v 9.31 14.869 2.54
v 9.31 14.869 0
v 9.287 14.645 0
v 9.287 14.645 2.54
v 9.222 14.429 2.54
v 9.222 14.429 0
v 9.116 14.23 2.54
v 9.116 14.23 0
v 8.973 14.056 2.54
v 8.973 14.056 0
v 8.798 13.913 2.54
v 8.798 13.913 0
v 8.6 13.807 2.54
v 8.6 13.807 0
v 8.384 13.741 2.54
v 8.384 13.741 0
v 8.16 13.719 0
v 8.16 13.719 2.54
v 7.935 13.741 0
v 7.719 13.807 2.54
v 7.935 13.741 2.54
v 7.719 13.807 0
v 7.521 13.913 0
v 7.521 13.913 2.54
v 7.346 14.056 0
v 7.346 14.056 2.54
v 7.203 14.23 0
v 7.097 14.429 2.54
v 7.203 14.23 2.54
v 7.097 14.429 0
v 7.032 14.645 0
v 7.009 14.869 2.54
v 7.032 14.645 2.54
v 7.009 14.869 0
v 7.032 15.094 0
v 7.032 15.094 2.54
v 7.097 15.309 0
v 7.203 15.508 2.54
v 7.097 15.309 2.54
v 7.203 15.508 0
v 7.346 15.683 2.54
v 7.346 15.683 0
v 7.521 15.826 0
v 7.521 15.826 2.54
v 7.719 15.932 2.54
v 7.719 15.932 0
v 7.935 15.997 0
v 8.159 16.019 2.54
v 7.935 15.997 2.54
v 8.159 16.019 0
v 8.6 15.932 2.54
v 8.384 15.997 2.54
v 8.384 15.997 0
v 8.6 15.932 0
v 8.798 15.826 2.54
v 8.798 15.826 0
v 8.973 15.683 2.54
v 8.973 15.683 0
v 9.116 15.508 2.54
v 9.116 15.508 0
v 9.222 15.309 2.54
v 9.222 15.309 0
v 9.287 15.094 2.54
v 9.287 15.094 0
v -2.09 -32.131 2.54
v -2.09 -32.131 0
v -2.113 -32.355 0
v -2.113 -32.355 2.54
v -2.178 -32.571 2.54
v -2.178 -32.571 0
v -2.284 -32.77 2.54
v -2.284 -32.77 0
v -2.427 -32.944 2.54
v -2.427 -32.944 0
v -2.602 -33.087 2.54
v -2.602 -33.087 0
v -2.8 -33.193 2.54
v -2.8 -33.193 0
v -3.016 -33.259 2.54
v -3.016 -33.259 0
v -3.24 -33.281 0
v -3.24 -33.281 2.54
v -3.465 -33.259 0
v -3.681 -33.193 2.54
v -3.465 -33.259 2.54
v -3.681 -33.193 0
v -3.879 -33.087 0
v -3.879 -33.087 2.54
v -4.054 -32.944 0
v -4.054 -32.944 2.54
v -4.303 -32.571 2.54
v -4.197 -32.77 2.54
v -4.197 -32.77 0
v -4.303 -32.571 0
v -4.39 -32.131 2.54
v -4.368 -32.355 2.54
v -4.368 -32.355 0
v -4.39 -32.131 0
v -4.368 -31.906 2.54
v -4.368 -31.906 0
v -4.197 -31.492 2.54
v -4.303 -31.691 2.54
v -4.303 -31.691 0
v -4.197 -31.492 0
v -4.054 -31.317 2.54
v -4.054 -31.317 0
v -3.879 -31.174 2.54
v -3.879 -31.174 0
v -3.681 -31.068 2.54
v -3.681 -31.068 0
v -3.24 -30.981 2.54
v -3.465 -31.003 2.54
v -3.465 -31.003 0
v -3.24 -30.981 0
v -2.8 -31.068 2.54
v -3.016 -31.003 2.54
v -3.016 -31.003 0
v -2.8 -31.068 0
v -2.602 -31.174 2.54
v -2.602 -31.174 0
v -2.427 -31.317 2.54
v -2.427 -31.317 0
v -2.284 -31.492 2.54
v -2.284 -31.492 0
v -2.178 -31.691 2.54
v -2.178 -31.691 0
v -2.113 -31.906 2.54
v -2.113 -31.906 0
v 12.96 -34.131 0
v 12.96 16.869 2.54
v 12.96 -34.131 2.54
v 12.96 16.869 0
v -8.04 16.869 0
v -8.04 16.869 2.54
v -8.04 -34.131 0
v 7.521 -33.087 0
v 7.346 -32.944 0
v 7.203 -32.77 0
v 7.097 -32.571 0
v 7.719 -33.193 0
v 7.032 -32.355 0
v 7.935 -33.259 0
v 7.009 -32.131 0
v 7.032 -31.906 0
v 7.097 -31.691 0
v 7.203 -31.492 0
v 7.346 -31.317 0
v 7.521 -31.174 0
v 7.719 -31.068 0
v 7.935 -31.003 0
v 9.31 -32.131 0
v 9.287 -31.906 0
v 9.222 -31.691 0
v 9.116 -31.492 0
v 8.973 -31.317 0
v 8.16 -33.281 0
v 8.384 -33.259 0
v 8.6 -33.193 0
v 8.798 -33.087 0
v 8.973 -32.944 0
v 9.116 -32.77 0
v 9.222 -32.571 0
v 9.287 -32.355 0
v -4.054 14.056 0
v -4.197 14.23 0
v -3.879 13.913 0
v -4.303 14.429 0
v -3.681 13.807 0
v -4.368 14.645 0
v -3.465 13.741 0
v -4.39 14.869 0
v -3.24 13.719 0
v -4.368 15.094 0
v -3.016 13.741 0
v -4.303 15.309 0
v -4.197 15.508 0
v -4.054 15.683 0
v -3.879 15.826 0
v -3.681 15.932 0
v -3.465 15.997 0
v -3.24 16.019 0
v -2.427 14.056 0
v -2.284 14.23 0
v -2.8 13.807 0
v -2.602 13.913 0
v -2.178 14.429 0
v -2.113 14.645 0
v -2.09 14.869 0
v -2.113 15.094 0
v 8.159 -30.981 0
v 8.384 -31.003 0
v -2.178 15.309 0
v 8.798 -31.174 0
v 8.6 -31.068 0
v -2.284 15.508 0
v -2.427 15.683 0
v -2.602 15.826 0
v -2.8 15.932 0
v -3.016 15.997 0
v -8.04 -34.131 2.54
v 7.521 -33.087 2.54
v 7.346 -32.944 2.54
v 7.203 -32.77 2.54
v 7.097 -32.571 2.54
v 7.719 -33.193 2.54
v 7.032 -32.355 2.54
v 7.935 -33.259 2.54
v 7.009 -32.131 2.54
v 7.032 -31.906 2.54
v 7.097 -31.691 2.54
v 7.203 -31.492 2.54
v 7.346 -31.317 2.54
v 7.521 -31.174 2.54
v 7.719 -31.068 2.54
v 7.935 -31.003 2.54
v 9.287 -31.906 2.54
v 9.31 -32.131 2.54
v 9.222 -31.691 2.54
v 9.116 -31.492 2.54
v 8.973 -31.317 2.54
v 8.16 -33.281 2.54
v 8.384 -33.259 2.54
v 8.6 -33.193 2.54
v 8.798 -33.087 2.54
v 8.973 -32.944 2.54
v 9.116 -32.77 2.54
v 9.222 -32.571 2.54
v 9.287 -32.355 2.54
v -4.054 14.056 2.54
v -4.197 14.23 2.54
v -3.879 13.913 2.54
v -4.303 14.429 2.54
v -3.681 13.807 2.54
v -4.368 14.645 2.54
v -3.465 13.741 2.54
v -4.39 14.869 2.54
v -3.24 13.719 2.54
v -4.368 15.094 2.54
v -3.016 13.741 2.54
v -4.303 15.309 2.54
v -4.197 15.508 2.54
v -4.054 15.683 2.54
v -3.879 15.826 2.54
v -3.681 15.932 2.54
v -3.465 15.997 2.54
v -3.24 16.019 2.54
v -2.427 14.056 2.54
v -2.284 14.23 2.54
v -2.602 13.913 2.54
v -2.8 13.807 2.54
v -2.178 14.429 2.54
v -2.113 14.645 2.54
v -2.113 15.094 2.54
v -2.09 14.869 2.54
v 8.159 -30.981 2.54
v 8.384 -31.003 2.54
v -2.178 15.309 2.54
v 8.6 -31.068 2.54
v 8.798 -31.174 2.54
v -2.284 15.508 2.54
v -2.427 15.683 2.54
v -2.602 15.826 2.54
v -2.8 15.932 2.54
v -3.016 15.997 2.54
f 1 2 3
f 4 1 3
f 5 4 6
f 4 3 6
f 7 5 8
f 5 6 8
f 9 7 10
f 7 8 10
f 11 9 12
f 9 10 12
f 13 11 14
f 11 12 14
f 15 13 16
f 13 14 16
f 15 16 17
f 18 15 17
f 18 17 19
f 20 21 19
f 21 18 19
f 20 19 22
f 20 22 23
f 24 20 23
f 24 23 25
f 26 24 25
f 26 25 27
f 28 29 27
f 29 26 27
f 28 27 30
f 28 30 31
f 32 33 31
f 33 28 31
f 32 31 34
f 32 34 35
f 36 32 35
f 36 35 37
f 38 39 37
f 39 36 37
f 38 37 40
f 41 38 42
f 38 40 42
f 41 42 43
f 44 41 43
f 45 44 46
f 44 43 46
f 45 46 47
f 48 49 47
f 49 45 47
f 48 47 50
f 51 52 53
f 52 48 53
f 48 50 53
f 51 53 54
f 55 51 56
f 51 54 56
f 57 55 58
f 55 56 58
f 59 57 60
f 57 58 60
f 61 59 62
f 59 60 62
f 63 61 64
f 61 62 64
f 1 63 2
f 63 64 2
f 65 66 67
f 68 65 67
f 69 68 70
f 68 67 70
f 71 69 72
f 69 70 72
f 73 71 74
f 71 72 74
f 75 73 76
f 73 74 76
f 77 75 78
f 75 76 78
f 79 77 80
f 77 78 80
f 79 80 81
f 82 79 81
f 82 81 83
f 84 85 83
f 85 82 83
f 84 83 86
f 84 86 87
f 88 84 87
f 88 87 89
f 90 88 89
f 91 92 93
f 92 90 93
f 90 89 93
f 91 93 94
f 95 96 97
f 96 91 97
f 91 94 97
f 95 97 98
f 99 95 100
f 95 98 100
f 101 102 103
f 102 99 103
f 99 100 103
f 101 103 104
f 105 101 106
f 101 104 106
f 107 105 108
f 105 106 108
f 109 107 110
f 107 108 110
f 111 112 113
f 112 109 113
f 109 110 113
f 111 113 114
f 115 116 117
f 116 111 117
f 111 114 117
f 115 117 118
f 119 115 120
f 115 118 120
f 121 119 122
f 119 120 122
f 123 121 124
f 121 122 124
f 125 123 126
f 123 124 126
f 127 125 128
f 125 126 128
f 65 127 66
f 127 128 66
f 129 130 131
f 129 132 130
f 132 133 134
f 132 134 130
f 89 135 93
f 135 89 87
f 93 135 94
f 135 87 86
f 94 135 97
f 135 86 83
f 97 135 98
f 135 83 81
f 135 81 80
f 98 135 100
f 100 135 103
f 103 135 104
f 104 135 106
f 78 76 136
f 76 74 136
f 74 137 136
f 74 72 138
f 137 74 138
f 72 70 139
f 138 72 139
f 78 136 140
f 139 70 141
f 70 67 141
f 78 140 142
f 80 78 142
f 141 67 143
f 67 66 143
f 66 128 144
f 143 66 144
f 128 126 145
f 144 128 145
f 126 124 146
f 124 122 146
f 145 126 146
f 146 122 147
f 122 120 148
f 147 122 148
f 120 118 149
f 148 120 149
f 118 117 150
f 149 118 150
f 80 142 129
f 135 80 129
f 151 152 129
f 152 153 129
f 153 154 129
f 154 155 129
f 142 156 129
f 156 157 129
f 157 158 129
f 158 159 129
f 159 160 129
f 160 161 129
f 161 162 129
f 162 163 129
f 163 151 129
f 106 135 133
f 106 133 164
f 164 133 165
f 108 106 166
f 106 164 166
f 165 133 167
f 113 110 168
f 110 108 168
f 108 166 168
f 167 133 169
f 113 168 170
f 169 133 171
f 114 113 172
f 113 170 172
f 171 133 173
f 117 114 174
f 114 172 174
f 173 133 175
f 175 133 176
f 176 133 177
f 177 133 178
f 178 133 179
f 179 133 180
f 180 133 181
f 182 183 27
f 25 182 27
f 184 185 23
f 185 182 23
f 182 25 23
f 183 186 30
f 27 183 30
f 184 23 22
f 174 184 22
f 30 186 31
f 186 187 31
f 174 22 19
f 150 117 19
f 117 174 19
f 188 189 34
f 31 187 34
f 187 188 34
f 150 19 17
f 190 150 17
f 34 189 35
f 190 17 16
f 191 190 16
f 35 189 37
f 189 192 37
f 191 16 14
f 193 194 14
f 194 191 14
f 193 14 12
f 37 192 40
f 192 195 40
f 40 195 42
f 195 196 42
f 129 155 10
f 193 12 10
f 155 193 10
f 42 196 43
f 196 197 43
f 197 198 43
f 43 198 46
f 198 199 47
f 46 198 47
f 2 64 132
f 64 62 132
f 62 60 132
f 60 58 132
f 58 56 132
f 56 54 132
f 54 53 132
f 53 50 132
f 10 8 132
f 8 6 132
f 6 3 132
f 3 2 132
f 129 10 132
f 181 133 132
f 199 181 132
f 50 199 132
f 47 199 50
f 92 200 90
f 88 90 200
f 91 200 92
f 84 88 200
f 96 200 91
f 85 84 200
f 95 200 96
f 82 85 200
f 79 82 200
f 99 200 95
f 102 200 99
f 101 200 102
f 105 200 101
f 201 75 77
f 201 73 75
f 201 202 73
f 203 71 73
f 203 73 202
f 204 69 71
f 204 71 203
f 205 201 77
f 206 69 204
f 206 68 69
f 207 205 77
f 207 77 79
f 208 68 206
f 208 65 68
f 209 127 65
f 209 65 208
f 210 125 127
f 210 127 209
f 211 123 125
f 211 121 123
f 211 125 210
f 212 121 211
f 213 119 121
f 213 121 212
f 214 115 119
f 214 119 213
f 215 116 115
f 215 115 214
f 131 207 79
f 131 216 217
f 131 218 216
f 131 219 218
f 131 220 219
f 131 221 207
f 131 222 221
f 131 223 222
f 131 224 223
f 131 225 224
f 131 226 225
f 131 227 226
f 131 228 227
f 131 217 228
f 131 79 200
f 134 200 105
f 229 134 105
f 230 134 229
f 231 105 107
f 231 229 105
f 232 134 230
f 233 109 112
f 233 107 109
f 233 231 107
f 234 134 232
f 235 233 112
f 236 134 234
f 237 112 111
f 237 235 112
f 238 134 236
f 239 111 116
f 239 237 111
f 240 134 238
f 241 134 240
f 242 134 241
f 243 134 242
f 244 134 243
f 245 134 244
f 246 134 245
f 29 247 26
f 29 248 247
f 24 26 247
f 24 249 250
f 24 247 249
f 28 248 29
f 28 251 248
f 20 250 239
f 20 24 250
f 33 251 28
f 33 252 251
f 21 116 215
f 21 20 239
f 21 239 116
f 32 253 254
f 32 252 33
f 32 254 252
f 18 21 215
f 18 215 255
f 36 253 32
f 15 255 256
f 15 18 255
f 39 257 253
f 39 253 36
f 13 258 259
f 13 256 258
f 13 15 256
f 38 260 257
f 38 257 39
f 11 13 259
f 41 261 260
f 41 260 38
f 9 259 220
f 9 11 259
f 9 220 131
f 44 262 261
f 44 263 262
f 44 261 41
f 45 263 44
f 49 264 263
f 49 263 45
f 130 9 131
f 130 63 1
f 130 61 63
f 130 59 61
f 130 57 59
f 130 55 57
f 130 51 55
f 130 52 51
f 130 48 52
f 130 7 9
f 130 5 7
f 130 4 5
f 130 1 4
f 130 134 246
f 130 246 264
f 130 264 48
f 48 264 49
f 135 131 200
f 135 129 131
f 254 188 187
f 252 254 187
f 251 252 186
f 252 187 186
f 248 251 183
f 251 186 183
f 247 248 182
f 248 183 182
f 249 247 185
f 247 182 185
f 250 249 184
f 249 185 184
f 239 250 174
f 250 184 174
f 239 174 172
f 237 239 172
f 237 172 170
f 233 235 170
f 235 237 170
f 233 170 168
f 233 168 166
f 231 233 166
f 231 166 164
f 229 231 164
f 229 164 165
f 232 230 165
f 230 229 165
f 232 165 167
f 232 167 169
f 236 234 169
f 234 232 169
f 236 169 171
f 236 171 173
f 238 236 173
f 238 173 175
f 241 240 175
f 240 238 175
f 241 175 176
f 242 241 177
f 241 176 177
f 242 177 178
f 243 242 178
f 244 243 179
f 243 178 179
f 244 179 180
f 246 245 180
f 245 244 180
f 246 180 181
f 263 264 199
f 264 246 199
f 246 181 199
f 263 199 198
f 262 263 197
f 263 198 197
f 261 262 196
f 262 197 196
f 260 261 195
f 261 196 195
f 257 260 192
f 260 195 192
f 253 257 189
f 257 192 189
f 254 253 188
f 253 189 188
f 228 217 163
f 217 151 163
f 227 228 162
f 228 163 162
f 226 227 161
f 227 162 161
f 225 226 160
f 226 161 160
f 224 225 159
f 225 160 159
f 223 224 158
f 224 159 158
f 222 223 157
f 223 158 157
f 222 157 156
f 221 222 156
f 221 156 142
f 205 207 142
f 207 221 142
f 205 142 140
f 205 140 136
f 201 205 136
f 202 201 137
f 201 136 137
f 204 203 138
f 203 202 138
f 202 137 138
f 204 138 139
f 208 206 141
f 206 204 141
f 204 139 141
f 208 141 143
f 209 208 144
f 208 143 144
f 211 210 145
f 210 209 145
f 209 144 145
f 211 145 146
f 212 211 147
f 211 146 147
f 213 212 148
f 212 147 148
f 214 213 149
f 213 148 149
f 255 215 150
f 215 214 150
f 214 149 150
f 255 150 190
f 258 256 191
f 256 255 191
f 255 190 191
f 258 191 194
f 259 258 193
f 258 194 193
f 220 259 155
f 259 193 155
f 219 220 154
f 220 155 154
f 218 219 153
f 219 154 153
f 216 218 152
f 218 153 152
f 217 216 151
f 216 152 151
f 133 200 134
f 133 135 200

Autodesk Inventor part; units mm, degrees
ref_plane "YZ Plane" through (0, 0, 0) normal (1, 0, 0) x (0, 1, 0)
ref_plane "XZ Plane" through (0, 0, 0) normal (0, 1, 0) x (-1, 0, 0)
ref_plane "XY Plane" through (0, 0, 0) normal (0, 0, 1) x (1, 0, 0)
sketch "Sketch1" plane through (0, 0, 0) normal (0, 0, 1) x (1, 0, 0)
  line L0 (-8.0405, 16.8694) -> (12.9595, 16.8694)
  line L1 (12.9595, 16.8694) -> (12.9595, -34.1306)
  line L2 (12.9595, -34.1306) -> (-8.0405, -34.1306)
  line L3 (-8.0405, -34.1306) -> (-8.0405, 16.8694)
  circle A0 centre (-3.2405, 14.8694) radius 1.05
  circle A1 centre (8.1595, 14.8694) radius 1.05
  circle A2 centre (-3.2405, -32.1306) radius 1.05
  circle A3 centre (8.1595, -32.1306) radius 1.05
  circle A4 centre (-3.2405, 14.8694) radius 1.15
  circle A5 centre (8.1595, 14.8694) radius 1.15
  circle A6 centre (-3.2405, -32.1306) radius 1.15
  circle A7 centre (8.1595, -32.1306) radius 1.15
  point P0 (0, 0)
  dimension "d0" = 21
  dimension "d1" = 51
  dimension "d2" = 2.1
  dimension "d3" = 2.1
  dimension "d4" = 2.1
  dimension "d5" = 2.1
  dimension "d6" = 2
  dimension "d7" = 2
  dimension "d8" = 2
  dimension "d9" = 2
  dimension "d10" = 11.4
  dimension "d11" = 4.8
  dimension "d12" = 11.4
  dimension "d13" = 4.8
  dimension "d14" = 0.1
  dimension "d15" = 0.1
  dimension "d16" = 0.1
  dimension "d17" = 0.1
extrude "Extrusion1" add sketch "Sketch1" along normal blind 2.54 contours L0 L1 L2 L3
properties part number "PicoTest"
